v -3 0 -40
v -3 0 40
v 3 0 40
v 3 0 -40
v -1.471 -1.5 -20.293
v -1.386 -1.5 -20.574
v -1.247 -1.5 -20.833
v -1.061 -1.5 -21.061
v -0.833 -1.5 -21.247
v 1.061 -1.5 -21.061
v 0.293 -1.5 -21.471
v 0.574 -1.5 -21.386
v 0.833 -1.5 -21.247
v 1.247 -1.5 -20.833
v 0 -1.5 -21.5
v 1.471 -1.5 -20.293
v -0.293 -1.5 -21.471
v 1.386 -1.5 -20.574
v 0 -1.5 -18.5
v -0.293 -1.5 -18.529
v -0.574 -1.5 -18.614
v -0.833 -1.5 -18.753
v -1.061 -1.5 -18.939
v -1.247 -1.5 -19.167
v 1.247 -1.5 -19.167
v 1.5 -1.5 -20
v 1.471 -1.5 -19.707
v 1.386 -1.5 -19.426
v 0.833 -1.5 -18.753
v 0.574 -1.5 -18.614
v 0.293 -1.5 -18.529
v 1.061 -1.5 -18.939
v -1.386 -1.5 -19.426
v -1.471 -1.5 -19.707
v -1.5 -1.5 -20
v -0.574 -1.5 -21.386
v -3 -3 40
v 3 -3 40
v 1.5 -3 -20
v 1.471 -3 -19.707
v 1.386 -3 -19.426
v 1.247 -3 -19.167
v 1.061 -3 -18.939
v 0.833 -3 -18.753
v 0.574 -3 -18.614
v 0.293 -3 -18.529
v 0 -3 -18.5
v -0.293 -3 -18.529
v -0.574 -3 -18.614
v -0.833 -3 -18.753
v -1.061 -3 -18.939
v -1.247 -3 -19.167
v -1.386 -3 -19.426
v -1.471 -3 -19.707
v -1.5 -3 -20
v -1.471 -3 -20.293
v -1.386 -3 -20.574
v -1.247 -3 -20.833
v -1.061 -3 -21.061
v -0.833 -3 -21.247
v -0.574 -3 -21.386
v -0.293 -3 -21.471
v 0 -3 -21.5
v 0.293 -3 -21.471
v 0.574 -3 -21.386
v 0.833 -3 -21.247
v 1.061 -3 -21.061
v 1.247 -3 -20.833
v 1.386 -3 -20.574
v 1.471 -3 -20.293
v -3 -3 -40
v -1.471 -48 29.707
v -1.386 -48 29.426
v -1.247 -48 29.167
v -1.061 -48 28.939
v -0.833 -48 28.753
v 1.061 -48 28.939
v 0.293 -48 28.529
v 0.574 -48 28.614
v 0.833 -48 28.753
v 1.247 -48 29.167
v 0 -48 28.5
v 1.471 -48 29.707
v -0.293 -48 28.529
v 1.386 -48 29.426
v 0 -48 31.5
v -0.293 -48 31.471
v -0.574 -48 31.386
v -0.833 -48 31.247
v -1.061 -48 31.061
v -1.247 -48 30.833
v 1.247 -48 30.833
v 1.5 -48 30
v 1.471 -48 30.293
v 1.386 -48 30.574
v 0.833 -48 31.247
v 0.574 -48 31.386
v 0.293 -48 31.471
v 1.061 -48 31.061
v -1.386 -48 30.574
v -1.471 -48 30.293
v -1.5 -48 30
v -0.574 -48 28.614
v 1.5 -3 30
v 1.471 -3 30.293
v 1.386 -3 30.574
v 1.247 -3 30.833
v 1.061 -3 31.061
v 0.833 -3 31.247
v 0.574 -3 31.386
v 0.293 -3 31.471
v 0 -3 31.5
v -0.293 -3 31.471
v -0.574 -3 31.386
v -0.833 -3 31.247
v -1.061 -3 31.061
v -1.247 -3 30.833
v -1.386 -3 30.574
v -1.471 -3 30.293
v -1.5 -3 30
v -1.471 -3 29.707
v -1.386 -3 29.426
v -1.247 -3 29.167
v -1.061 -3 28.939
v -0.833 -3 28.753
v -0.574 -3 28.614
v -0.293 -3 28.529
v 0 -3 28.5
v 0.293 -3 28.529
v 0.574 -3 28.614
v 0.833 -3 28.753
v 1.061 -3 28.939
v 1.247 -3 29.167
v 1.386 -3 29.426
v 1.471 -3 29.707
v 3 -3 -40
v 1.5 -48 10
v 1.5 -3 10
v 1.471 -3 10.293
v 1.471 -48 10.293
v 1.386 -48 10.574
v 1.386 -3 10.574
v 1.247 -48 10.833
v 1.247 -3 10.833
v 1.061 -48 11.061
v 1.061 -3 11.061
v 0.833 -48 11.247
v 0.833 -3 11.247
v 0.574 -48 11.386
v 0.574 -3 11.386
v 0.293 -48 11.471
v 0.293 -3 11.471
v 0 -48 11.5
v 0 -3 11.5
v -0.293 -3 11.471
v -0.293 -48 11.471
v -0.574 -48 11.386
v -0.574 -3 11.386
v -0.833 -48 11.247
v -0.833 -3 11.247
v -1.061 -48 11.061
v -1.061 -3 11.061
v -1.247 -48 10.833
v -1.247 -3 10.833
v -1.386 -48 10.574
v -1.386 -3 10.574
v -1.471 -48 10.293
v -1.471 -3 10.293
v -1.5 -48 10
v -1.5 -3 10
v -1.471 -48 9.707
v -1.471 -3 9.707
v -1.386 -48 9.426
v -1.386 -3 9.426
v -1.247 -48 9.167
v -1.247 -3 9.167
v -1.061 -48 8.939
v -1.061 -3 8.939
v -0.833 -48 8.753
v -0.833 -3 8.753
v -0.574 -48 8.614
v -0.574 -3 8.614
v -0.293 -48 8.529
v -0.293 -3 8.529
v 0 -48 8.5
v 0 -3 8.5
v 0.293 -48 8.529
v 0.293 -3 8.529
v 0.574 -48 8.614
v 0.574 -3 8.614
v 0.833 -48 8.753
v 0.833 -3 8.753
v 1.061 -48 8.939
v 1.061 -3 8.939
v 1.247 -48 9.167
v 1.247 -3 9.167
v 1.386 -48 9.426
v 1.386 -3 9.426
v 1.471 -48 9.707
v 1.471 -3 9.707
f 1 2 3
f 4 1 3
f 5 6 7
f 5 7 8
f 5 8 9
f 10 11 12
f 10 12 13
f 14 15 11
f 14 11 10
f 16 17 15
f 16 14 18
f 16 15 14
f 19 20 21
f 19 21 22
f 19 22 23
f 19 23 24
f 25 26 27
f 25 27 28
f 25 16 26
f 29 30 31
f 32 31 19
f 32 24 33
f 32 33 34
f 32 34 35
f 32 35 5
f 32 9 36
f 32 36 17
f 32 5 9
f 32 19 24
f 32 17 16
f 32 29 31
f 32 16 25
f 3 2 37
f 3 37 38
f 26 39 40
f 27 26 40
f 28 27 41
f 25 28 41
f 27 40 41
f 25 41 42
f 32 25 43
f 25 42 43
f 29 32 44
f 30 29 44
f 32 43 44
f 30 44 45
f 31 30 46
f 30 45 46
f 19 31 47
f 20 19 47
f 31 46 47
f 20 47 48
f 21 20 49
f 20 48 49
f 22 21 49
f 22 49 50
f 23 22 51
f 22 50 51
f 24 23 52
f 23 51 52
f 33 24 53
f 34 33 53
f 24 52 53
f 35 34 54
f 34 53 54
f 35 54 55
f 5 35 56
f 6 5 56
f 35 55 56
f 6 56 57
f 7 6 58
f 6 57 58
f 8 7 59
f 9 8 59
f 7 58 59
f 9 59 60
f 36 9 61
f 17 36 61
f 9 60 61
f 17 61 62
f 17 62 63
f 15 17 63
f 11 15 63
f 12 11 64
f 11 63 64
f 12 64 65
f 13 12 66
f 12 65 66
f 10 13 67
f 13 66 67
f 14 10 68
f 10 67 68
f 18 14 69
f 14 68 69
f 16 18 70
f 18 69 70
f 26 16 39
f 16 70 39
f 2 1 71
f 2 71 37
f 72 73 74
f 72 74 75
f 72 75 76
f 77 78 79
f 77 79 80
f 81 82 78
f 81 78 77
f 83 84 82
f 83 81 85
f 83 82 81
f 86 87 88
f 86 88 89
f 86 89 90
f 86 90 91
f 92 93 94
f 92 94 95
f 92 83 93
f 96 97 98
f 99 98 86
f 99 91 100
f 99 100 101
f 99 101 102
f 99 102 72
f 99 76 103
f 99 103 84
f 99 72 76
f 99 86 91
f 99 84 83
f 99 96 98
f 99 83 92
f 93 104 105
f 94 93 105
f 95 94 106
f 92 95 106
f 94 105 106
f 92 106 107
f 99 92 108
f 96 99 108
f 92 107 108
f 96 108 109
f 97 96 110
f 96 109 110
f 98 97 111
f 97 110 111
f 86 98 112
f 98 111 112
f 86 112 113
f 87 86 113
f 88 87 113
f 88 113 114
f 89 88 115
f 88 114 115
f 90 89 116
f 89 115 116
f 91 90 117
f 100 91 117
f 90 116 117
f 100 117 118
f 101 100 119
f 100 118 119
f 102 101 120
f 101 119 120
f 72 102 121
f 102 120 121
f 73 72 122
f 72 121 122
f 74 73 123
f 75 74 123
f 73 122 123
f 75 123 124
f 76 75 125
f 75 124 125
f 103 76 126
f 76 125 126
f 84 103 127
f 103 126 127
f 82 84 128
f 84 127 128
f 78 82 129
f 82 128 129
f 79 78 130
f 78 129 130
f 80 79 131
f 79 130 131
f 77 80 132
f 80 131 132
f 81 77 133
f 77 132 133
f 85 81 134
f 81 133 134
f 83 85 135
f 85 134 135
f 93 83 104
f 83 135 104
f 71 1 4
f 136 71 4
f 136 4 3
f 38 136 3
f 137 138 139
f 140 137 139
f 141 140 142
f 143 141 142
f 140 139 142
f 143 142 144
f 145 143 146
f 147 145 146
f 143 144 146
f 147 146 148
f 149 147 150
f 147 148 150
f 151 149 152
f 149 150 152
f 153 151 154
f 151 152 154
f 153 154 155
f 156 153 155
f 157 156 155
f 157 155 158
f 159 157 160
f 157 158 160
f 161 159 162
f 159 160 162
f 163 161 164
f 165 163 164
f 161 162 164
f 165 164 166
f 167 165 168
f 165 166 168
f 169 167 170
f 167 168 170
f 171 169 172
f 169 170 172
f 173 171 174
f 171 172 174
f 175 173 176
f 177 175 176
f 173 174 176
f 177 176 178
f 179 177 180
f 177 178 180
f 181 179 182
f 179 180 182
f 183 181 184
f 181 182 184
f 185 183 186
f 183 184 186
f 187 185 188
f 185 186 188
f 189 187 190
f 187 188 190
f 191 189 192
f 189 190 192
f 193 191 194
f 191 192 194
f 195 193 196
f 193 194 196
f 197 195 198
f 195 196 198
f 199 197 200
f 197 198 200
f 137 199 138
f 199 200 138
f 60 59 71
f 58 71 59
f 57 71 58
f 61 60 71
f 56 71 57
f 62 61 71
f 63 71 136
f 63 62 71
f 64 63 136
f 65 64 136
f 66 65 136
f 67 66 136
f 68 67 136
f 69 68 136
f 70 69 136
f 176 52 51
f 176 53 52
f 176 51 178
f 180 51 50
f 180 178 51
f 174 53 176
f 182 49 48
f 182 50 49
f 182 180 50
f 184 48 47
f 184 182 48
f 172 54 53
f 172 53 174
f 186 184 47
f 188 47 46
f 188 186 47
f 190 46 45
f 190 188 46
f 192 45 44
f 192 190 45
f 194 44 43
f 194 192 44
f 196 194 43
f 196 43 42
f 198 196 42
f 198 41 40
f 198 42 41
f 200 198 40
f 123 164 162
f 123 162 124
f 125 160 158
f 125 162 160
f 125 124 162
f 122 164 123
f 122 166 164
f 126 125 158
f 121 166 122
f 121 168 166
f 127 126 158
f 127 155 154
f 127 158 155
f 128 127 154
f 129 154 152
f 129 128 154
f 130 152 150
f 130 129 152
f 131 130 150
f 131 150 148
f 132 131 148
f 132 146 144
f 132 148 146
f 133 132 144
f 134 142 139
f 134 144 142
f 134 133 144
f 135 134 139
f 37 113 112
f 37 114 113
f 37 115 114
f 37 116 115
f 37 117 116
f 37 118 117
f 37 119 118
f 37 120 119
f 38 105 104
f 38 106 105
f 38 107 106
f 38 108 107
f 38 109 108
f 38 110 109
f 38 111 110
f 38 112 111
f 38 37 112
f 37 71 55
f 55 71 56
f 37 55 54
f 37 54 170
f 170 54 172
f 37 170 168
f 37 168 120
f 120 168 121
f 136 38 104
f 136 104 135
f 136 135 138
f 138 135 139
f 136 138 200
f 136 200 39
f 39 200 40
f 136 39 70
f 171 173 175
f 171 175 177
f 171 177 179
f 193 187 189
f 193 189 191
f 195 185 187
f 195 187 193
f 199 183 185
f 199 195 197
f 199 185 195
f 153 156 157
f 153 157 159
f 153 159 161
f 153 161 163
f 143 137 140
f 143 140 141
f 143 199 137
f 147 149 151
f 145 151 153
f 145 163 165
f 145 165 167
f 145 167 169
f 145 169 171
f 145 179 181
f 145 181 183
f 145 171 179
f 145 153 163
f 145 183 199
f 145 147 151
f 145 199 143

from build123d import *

# Parameters (mm, degrees)
F0_W     = 6
F0_H     = 80
F1_DEPTH = 3
F2_R     = 1.5
F3_DEPTH = 1.5
F4_R     = 1.5
F5_DEPTH = 45


with BuildPart() as f1:
    # F0 (on Front) → F1 (new body)
    with BuildSketch(Plane.XZ):
        Rectangle(F0_W, F0_H)
    extrude(amount=F1_DEPTH)

    # F2 (on face) → F3 (cut)
    with BuildSketch(Plane.XZ.offset(3)):
        with Locations((0, -20)):
            Circle(F2_R)
    extrude(amount=-F3_DEPTH, mode=Mode.SUBTRACT)

    # F4 (on face) → F5 (join)
    with BuildSketch(Plane.XZ.offset(3)):
        with Locations((0, 10)):
            Circle(F4_R)
        with Locations((0, 30)):
            Circle(F4_R)
    extrude(amount=F5_DEPTH)


solid = f1.part
